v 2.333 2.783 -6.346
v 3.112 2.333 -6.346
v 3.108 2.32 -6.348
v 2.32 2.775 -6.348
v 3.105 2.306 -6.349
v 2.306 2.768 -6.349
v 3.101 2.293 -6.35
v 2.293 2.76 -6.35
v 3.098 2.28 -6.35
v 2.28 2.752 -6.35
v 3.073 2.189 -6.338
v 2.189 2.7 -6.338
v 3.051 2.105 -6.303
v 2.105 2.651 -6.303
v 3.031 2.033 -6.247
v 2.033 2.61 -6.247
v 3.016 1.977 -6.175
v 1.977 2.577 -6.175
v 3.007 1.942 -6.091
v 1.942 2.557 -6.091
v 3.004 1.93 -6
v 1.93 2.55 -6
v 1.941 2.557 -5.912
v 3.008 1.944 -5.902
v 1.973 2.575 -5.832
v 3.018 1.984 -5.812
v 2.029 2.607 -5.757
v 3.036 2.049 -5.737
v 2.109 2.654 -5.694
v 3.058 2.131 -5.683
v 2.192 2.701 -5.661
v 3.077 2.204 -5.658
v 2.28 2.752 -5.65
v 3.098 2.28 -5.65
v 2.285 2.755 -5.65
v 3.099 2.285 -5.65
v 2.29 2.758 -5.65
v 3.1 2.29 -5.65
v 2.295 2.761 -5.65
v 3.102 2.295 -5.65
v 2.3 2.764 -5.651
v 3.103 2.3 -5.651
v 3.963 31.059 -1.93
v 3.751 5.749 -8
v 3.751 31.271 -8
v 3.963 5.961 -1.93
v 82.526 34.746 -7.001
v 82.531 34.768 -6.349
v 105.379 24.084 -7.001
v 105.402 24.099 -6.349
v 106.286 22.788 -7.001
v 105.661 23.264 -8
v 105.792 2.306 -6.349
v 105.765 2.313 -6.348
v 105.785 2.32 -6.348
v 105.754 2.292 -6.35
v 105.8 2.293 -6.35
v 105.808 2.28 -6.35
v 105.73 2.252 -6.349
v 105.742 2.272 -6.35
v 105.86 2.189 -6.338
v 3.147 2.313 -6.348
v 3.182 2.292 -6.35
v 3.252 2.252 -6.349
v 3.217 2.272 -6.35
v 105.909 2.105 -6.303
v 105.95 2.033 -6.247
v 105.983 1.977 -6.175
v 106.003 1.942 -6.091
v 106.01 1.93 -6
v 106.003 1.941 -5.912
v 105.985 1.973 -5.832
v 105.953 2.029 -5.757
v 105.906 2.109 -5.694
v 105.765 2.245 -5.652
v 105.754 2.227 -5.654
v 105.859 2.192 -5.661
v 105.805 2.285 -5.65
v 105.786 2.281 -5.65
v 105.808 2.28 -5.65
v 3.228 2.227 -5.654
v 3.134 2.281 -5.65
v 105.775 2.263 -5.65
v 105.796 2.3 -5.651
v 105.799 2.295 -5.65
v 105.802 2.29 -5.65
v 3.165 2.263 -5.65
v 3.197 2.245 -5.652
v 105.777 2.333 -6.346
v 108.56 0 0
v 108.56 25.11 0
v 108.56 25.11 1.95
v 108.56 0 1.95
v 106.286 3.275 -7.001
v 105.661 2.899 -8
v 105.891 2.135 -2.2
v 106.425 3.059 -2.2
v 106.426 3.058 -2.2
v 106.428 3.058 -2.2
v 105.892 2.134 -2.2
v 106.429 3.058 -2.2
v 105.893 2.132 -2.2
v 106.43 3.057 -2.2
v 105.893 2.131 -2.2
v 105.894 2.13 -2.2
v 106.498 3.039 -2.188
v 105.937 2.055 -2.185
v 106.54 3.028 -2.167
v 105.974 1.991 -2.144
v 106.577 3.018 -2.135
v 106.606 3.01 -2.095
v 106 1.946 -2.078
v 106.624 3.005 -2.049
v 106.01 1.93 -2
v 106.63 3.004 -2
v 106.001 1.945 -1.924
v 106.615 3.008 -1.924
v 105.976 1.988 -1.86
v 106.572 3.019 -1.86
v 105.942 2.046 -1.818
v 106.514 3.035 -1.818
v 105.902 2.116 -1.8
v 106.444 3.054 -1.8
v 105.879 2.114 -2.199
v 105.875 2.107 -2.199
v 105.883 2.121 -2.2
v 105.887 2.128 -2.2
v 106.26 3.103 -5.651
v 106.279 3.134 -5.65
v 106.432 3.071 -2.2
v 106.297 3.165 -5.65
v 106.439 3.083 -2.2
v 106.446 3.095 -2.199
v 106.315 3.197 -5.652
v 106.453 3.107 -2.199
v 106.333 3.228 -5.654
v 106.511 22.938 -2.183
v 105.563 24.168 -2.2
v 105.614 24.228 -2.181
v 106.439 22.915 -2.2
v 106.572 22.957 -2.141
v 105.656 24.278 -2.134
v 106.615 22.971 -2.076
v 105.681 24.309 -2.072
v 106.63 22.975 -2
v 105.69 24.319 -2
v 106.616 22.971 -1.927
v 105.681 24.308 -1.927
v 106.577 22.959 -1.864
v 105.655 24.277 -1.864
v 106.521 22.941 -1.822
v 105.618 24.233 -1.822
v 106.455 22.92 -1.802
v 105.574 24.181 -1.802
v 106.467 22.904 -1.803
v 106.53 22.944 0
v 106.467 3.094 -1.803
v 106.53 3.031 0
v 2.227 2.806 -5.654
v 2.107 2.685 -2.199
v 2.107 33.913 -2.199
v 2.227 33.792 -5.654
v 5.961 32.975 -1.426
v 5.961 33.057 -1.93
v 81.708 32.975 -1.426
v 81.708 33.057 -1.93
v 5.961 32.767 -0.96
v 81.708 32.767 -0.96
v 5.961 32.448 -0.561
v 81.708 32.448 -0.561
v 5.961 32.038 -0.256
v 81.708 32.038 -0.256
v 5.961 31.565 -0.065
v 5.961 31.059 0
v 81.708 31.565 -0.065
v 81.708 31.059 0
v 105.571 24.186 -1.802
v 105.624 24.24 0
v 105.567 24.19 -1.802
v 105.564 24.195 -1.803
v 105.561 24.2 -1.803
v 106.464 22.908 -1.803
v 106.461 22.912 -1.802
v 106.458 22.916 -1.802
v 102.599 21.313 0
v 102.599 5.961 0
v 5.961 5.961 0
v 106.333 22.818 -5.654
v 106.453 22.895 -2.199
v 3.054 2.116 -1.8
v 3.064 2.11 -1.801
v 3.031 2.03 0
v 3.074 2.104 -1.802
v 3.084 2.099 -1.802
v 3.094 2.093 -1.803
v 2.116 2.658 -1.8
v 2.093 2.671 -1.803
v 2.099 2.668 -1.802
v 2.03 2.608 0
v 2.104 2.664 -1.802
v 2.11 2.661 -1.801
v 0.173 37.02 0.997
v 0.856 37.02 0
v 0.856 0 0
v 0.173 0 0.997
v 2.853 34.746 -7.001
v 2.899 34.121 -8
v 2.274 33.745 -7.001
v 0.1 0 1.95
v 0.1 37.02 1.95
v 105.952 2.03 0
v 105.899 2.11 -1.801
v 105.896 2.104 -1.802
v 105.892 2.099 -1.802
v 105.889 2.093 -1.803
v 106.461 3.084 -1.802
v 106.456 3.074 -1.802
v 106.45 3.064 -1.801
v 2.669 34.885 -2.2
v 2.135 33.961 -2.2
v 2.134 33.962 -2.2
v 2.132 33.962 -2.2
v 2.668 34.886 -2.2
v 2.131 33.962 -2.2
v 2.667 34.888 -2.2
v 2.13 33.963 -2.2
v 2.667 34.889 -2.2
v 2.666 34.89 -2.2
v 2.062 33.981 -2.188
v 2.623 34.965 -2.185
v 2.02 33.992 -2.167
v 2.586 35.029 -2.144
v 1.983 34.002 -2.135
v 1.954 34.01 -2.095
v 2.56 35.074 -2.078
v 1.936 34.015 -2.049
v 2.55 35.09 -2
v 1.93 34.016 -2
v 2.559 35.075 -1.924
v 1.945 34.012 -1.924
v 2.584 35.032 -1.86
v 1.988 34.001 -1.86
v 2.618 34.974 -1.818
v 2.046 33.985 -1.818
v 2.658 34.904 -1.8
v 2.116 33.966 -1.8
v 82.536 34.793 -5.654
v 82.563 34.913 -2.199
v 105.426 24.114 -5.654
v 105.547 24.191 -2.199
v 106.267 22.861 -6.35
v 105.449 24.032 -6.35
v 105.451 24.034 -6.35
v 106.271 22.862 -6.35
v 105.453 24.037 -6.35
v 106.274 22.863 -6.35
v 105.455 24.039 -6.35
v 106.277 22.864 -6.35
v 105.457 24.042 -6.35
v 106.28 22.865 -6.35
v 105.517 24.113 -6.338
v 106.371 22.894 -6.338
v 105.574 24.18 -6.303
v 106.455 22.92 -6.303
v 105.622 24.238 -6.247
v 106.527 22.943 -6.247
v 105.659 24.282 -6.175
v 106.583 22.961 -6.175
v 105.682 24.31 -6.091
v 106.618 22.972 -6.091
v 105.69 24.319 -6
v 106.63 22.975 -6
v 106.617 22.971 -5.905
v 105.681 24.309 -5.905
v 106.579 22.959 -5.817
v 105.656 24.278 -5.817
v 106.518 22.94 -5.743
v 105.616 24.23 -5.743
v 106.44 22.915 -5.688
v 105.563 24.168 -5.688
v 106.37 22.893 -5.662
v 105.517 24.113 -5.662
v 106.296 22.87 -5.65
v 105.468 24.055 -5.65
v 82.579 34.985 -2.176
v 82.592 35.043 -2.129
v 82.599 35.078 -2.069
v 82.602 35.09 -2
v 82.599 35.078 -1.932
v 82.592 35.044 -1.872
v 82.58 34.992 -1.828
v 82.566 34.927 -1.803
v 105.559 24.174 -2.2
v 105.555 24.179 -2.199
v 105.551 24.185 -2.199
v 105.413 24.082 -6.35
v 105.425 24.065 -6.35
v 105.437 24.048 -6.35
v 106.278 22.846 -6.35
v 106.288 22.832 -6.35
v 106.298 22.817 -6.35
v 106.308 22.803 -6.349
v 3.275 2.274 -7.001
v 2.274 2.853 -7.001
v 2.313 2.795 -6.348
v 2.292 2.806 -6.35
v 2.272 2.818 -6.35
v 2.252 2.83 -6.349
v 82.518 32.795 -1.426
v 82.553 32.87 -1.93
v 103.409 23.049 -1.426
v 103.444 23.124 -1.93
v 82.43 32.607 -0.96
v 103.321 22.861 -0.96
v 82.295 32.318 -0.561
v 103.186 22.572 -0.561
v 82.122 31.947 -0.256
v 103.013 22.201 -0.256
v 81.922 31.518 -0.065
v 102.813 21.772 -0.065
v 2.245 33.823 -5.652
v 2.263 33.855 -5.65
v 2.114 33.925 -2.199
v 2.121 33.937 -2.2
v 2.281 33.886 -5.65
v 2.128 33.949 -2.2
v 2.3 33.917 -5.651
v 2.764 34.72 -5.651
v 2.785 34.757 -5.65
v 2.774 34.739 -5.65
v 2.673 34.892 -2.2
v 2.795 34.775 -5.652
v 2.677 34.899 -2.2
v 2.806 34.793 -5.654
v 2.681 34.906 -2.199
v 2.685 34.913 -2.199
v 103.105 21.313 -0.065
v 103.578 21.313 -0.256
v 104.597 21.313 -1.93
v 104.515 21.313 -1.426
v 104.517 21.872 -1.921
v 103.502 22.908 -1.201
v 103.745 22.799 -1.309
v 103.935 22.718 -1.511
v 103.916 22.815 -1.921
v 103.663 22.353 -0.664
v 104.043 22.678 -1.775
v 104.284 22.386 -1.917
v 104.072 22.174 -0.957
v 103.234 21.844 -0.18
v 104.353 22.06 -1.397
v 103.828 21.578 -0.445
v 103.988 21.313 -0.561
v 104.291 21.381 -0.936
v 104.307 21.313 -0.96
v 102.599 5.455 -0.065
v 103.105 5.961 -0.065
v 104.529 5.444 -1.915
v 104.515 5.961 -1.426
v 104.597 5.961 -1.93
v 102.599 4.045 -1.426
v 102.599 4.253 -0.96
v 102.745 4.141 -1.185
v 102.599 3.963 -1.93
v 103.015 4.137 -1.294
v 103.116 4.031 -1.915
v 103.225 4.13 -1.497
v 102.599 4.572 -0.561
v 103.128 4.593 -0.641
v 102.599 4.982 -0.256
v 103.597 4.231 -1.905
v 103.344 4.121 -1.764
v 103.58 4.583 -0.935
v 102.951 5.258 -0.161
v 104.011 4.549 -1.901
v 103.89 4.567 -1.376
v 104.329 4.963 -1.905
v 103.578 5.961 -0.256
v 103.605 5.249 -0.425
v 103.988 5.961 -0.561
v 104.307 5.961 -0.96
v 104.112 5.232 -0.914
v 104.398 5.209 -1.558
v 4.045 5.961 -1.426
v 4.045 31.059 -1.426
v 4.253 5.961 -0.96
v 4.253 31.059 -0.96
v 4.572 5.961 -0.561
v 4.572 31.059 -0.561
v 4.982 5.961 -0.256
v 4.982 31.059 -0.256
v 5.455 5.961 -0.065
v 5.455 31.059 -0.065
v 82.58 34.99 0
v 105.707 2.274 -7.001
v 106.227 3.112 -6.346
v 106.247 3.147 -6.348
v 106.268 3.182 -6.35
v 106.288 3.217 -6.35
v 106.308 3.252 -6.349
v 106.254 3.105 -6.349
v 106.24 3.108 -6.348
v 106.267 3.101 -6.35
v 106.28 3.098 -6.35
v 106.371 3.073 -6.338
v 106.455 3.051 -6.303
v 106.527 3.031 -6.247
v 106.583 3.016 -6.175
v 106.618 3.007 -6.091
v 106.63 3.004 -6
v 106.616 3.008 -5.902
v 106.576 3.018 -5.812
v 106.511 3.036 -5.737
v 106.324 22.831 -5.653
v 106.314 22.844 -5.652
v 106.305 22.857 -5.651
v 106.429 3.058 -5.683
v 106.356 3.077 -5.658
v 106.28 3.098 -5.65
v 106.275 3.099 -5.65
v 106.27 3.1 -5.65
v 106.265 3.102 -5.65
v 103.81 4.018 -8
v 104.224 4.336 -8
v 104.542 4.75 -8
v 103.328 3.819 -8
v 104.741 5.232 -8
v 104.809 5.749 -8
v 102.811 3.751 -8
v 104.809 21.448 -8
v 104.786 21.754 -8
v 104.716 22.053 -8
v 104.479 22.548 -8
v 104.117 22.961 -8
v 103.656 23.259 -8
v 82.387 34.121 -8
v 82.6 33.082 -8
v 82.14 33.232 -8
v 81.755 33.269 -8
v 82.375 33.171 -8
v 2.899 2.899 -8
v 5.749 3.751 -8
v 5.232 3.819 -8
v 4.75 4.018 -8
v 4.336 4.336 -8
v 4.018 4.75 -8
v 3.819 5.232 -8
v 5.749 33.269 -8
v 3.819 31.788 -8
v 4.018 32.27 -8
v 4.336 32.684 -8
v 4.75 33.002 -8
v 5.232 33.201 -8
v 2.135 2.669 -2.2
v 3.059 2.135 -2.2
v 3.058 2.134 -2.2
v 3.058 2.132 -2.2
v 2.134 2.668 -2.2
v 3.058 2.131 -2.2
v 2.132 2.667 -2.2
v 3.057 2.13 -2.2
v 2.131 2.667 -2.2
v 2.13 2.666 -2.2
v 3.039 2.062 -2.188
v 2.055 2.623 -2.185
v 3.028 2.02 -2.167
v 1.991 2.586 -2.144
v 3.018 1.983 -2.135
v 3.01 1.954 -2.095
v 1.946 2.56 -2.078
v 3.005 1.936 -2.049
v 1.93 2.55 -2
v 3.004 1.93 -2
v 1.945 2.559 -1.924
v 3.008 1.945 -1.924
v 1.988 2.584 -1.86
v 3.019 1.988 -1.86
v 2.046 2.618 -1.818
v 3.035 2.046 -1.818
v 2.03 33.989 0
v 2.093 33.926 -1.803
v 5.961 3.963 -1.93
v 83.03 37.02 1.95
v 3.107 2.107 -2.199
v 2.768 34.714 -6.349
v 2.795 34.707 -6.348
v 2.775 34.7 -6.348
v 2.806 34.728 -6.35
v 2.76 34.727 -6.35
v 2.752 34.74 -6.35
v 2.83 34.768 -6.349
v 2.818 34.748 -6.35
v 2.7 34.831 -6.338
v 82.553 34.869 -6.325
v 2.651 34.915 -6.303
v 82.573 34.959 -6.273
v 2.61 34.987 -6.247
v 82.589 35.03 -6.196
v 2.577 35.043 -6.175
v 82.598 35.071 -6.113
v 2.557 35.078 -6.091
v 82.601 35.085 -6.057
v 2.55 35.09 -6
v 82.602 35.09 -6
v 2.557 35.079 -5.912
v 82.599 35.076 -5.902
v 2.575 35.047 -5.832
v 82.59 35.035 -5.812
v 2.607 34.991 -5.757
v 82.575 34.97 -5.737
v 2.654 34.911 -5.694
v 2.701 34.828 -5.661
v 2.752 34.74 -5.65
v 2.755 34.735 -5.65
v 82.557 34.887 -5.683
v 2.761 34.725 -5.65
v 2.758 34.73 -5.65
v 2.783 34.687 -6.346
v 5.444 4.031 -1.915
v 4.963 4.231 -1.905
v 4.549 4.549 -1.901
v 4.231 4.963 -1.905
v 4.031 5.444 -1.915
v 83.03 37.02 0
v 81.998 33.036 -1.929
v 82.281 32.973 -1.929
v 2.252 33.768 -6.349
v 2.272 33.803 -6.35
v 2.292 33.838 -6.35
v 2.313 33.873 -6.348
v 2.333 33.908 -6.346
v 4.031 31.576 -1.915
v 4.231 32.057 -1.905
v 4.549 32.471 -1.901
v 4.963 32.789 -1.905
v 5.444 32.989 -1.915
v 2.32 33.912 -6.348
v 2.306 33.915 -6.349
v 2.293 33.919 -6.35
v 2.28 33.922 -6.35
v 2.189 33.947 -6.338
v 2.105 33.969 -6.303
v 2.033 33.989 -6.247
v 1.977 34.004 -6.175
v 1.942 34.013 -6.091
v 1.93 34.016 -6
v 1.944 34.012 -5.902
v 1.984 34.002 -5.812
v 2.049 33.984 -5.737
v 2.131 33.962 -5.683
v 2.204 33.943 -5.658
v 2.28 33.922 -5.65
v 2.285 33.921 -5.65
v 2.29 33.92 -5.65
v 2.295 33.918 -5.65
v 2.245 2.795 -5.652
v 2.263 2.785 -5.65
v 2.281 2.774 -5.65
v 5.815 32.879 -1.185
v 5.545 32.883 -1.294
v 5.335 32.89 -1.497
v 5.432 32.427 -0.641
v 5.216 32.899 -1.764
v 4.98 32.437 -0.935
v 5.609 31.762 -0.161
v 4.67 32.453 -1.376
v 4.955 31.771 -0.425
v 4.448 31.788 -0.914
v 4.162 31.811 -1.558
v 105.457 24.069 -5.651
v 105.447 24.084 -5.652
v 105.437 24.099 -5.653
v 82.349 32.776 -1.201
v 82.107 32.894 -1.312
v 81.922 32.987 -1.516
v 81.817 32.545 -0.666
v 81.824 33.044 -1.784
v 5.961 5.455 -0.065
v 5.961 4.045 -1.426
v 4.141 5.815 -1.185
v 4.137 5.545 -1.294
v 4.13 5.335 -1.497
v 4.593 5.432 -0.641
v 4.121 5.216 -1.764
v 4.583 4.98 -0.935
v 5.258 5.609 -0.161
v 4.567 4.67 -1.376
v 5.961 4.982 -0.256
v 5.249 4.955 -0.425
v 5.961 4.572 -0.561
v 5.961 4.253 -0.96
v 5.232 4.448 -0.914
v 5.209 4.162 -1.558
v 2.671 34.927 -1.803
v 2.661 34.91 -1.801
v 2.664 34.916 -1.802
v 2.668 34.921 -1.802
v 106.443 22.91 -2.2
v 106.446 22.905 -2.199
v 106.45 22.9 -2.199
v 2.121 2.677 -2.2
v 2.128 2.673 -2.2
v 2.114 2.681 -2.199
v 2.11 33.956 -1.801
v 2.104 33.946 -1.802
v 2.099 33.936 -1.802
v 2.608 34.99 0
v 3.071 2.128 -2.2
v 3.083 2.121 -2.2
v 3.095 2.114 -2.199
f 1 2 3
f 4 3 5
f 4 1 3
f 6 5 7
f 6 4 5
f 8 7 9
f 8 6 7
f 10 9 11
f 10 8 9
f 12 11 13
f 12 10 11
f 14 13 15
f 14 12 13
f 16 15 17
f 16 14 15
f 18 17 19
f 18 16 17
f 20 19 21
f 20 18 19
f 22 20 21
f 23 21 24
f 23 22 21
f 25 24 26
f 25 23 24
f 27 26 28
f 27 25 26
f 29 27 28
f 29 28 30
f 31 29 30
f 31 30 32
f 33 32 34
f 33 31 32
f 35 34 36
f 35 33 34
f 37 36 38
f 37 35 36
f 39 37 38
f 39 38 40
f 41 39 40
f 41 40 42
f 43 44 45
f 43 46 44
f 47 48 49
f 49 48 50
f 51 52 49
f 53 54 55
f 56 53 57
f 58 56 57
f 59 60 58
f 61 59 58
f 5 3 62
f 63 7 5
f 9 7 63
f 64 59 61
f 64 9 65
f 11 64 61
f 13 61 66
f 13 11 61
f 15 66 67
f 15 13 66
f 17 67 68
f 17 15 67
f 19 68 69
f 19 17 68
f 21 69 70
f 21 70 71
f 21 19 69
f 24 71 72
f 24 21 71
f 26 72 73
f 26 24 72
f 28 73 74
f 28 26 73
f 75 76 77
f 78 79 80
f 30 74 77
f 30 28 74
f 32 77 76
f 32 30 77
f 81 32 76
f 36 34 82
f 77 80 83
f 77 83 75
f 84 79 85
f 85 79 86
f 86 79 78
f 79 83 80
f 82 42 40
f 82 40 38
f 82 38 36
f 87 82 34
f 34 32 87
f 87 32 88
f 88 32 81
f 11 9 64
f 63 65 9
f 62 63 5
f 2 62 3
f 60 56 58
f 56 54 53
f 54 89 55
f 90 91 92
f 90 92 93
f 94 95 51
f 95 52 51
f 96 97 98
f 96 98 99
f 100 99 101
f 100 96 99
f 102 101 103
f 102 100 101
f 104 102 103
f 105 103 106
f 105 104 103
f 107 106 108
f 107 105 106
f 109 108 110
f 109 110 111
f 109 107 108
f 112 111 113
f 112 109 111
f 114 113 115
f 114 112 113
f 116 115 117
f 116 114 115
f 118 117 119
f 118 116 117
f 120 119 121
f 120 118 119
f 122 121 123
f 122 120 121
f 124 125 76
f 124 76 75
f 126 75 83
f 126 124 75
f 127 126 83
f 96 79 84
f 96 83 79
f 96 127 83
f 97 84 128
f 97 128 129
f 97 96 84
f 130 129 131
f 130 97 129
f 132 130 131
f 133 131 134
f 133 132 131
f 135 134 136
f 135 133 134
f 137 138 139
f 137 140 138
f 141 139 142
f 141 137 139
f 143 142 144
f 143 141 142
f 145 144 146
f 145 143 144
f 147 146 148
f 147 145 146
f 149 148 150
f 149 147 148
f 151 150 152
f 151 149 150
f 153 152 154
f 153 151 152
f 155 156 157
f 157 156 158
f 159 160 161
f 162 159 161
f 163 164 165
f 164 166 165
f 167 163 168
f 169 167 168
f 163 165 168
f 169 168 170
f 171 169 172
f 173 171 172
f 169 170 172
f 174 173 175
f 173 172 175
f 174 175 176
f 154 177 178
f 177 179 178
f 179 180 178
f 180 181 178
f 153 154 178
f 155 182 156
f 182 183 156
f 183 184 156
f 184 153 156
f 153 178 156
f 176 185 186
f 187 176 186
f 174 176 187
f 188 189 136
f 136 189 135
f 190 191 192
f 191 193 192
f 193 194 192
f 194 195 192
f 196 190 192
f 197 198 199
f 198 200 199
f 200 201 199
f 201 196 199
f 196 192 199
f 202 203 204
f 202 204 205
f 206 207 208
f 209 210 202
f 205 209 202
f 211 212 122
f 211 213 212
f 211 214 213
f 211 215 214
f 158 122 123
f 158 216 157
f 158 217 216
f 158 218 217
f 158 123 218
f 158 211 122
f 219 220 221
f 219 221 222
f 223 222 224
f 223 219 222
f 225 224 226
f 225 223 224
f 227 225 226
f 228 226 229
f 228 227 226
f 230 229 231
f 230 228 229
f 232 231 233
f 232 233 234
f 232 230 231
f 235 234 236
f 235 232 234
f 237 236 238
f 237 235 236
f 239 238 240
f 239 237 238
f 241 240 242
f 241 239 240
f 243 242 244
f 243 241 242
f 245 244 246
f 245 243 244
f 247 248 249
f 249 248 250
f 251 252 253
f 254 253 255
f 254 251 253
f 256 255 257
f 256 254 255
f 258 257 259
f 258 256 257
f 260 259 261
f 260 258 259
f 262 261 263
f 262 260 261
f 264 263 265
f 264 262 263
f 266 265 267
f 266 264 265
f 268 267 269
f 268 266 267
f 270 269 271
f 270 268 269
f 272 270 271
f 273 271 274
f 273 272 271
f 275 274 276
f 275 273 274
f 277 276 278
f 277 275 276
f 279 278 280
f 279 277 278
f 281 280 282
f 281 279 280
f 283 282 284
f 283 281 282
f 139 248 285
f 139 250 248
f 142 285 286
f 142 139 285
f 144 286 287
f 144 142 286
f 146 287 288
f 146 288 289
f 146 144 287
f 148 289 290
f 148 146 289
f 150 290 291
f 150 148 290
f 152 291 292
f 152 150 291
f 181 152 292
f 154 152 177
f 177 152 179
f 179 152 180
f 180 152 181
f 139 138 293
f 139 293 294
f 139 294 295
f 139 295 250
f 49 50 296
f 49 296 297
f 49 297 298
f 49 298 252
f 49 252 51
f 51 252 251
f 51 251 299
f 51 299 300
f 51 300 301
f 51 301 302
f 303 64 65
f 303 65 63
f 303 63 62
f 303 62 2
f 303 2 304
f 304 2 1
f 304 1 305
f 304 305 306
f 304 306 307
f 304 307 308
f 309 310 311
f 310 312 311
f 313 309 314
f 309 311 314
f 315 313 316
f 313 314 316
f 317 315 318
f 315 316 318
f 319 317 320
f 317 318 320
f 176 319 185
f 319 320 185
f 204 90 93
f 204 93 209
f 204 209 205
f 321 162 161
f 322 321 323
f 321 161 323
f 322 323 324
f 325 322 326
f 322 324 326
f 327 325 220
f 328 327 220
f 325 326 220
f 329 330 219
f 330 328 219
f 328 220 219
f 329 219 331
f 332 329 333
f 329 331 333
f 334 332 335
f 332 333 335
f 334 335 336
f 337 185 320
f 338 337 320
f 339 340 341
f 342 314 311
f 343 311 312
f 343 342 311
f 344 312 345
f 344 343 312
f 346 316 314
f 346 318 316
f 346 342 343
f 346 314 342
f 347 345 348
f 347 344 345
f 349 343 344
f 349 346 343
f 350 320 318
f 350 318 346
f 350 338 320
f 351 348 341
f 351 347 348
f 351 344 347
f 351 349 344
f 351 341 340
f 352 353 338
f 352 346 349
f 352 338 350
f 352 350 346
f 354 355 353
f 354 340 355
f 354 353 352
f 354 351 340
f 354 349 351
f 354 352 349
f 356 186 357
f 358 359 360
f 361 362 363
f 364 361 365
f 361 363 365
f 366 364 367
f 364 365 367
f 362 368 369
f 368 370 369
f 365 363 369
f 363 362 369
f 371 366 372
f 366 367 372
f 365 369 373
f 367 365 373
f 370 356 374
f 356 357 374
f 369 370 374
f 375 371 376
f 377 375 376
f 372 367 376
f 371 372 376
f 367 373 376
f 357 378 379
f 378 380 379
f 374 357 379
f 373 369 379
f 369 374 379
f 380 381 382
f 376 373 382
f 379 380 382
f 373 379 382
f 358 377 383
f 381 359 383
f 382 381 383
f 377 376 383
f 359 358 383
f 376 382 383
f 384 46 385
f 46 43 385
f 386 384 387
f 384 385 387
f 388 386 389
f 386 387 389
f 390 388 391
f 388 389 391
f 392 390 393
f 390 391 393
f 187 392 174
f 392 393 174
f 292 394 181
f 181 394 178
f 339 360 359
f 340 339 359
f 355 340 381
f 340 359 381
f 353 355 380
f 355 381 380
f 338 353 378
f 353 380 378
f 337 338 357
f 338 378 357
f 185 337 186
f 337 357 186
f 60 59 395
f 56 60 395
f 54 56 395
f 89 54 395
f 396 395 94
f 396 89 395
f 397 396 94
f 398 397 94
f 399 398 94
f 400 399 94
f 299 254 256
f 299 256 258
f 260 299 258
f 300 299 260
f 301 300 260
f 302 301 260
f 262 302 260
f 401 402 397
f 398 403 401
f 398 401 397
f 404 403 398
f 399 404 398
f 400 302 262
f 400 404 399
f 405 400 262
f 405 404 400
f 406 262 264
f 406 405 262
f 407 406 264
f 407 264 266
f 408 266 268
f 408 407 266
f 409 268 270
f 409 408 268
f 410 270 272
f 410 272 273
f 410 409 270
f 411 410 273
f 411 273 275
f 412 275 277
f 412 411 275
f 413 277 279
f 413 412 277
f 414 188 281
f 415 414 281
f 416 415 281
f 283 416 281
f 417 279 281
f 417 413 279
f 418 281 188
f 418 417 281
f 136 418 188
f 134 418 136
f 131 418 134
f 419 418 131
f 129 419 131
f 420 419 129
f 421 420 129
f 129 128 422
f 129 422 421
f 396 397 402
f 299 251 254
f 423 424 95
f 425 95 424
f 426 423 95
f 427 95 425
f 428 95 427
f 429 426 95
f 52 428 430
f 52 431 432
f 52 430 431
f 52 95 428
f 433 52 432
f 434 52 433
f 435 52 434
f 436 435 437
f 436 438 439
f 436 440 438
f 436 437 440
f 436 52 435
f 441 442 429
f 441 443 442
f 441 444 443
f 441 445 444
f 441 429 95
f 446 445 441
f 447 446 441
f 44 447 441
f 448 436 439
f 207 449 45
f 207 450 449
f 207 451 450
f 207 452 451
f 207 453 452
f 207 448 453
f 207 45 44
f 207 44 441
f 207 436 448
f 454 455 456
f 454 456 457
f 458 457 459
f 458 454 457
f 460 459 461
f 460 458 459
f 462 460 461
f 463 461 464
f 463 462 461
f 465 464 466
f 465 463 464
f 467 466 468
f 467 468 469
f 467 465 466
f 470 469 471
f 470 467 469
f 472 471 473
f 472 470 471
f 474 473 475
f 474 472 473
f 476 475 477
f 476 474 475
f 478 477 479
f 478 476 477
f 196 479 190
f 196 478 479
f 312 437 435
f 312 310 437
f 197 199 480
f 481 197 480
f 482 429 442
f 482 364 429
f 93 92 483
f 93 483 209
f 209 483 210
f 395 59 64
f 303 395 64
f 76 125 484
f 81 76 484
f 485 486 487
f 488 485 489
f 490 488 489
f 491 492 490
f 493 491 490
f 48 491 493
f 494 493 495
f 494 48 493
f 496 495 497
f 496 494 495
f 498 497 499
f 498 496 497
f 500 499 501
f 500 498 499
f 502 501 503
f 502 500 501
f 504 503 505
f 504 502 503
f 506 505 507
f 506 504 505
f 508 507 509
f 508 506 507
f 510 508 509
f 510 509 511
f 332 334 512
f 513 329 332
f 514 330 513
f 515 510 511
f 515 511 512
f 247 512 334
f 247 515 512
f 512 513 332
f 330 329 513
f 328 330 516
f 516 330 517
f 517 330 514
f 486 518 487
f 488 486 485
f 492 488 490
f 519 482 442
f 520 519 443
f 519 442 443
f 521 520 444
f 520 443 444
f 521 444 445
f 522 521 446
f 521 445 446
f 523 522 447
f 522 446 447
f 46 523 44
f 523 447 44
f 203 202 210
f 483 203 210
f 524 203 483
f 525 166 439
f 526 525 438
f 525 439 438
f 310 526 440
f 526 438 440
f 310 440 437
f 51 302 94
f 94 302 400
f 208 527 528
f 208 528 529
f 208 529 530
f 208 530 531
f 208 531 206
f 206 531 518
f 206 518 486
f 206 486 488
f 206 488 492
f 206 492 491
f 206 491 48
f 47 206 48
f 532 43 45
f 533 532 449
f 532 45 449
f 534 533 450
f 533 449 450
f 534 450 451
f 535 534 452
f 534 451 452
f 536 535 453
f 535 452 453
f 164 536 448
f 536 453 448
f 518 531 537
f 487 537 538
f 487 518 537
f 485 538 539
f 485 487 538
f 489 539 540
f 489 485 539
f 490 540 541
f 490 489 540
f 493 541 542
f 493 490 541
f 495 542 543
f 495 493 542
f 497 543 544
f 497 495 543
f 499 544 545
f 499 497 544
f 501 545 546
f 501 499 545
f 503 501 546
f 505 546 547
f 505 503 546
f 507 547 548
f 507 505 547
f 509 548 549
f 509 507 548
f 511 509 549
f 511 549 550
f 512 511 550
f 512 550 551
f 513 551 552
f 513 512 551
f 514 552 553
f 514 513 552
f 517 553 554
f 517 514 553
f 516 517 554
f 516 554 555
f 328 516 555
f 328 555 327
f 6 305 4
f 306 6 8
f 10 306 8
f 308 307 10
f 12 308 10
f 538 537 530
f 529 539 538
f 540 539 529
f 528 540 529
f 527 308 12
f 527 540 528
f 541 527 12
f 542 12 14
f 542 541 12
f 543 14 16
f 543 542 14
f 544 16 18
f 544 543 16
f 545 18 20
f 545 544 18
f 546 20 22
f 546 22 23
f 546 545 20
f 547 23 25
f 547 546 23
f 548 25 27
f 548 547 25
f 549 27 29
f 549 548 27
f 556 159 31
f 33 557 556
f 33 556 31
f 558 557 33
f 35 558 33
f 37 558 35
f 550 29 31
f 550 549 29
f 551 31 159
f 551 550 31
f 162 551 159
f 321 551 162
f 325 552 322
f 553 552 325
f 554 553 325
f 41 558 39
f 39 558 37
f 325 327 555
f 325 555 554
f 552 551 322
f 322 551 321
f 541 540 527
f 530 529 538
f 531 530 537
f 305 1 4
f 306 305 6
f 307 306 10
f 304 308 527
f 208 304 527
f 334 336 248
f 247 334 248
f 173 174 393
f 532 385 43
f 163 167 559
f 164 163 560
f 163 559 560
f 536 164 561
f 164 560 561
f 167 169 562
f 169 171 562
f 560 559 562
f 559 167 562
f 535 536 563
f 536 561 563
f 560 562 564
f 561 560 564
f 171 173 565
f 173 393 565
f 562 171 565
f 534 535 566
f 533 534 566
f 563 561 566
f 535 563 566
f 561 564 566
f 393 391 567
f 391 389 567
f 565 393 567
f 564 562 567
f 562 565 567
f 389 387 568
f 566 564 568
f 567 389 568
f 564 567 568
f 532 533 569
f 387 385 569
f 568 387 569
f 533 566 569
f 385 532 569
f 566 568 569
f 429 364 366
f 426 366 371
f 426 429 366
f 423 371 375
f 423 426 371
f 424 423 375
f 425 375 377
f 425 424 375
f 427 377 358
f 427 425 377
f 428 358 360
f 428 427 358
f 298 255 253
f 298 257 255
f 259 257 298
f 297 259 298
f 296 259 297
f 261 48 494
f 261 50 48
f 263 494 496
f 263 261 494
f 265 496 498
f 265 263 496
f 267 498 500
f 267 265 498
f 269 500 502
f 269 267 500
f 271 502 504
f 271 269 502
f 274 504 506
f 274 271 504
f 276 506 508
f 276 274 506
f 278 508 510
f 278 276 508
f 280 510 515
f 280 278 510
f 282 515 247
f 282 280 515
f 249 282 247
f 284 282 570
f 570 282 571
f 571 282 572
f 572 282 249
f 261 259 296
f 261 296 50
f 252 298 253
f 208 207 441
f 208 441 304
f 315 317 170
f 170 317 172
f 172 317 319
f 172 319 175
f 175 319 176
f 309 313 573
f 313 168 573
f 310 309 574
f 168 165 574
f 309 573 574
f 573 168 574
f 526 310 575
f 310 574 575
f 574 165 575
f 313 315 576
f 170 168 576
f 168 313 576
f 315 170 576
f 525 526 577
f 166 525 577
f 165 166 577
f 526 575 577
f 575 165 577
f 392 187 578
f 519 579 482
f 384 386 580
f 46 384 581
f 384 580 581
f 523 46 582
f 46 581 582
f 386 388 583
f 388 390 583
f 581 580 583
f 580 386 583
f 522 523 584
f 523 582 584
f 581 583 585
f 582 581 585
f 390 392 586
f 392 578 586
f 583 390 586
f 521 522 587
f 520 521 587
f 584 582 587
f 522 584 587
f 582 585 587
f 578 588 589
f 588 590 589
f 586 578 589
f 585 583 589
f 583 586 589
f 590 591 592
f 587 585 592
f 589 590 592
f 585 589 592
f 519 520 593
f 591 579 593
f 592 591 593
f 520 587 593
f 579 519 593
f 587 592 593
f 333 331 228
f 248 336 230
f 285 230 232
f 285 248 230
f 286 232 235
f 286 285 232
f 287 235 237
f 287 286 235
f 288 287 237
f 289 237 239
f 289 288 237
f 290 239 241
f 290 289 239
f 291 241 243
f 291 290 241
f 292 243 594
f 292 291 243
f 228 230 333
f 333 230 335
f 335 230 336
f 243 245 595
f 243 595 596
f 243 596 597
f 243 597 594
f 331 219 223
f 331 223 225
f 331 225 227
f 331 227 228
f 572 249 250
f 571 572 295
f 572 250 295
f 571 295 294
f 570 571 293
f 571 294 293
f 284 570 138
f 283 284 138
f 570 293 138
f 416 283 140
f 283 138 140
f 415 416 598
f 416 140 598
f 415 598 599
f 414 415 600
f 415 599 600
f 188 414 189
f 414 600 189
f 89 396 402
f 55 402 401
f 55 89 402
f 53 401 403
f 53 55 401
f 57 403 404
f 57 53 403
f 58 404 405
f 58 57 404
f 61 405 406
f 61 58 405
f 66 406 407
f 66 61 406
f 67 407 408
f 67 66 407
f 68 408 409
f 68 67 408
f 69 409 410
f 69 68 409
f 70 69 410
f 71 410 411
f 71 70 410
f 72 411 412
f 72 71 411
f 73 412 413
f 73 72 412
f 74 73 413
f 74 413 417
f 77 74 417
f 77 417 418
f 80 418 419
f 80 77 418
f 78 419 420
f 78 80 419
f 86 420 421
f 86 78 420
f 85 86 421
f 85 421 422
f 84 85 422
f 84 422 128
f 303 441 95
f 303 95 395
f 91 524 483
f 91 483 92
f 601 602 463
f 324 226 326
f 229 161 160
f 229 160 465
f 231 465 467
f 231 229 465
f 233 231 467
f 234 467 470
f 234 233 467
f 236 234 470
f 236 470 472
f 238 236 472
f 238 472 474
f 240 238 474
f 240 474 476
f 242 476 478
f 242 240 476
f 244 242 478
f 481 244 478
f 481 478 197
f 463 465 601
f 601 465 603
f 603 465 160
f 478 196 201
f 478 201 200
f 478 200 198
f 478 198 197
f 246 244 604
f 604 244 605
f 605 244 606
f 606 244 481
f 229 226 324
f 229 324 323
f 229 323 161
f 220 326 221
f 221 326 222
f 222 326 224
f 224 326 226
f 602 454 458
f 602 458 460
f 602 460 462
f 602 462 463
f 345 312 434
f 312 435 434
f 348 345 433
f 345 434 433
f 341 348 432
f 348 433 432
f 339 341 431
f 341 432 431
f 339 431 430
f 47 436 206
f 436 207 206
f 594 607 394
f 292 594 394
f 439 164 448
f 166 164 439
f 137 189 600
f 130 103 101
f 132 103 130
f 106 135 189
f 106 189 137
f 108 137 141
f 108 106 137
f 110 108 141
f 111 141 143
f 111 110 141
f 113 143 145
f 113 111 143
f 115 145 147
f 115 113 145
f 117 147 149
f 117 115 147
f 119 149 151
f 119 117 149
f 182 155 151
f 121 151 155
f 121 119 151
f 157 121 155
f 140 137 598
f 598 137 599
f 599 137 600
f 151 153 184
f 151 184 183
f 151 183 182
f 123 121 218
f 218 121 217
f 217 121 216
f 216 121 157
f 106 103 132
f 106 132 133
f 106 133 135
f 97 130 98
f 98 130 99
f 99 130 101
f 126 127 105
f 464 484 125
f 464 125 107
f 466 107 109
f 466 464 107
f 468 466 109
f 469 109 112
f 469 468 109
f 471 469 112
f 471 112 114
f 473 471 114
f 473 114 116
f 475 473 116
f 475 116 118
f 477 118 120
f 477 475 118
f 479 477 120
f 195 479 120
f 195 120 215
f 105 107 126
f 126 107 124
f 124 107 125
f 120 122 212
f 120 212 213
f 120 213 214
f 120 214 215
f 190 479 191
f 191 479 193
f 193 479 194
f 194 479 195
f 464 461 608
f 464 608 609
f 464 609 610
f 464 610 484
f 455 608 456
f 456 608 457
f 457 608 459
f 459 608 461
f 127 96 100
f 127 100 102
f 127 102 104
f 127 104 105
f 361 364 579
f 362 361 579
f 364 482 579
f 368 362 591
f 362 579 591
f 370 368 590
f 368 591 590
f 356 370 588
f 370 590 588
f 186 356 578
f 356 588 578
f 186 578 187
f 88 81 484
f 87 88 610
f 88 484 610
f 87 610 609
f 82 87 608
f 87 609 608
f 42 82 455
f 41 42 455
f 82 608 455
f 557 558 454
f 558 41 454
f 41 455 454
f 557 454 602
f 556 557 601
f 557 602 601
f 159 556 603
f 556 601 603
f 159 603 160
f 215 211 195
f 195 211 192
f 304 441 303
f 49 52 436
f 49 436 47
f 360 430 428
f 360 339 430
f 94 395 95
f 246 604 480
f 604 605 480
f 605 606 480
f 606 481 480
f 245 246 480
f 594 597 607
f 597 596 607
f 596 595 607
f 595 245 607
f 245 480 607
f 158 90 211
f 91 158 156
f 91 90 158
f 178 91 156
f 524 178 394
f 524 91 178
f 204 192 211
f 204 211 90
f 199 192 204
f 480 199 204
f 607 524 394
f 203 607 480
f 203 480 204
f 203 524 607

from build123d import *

# Parameters (mm, degrees)
BOSS_EXTRUDE1_DEPTH = 1.95
EXTRUDE_THIN1_DEPTH = 8
EXTRUDE_THIN1_DRAFT = 2
CUT_EXTRUDE1_DEPTH  = 115.977189042
FILLET1_R           = 2
SWEEP4_PROFILE_R    = 0.35
SWEEP5_PROFILE_R    = 0.2


with BuildPart() as part:
    # Sketch1 → Boss-Extrude1 (new body)
    with BuildSketch(Plane.XY):
        Polygon((0, 0), (0, 37.02), (83.03, 37.02), (108.56, 25.11), (108.56, 0), align=None)
    extrude(amount=BOSS_EXTRUDE1_DEPTH)


with BuildPart() as extrude_thin1_tool:
    # Sketch2 → Extrude-Thin1 (with draft: the straight prism first)
    with BuildSketch(Plane(origin=(0, 0, 0), x_dir=(-1, 0, 0), z_dir=(0, 0, -1))):
        Polygon((-106.53, 2.03), (-2.03, 2.03), (-2.03, 34.99), (-82.579782869, 34.99), (-106.53, 23.816984488), align=None)
        Polygon((-104.53, 4.03), (-4.03, 4.03), (-4.03, 32.99), (-82.136219193, 32.99), (-104.53, 22.543077579), align=None, mode=Mode.SUBTRACT)
    extrude(amount=EXTRUDE_THIN1_DEPTH)
    # Extrude-Thin1: the draft: its side faces are tilted about the plane it starts from
    extrude_thin1_sides = [extrude_thin1_tool.faces().sort_by_distance(p)[0] for p in [
        (54.28, 2.03, -4),
        (2.03, 18.51, -4),
        (42.304891435, 34.99, -4),
        (94.554891435, 29.403492244, -4),
        (106.53, 12.923492244, -4),
        (104.53, 13.286538789, -4),
        (93.333109597, 27.766538789, -4),
        (43.083109597, 32.99, -4),
        (4.03, 18.51, -4),
        (54.28, 4.03, -4),
    ]]
    draft(extrude_thin1_sides, Plane(origin=(0, 0, 0), x_dir=(-1, 0, 0), z_dir=(0, 0, -1)), EXTRUDE_THIN1_DRAFT)


with BuildPart() as part_1:
    add(part.part)

    # Extrude-Thin1: add extrude_thin1_tool
    add(extrude_thin1_tool.part)

    # Sketch3 → Cut-Extrude1 (cut, through all)
    with BuildSketch(Plane(origin=(0, 37.02, 0), x_dir=(1, 0, 0), z_dir=(0, 1, 0))):
        Polygon((0, -1.95), (0.1, -1.95), (0.25, 0), (0, 0), align=None)
    extrude(amount=-CUT_EXTRUDE1_DEPTH, mode=Mode.SUBTRACT)

    # Fillet1
    fillet1_edges = [part_1.edges().sort_by_distance(p)[0] for p in [
        (104.53, 13.286538789, 0),
        (54.28, 4.03, 0),
        (4.03, 18.51, 0),
        (43.083109597, 32.99, 0),
        (93.333109597, 27.766538789, 0),
        (104.669683078, 3.890316922, -4),
        (3.890316922, 3.890316922, -4),
        (3.890316922, 33.129683078, -4),
        (82.167198363, 33.129683078, -4),
        (104.669683078, 22.632049198, -4),
    ]]
    fillet(fillet1_edges, radius=FILLET1_R)

    # Chamfer1
    # the kernel refuses this chamfer: 1, 0.87289825, 0.605967864, 0.589589202, 0.577756975 mm, written as the material it takes off along each edge
    with BuildSketch(Plane(origin=(105.775216634, 23.378600332, -7.333739449), x_dir=(-0.21304506320944425, 0.6200388912519721, 0.7550917655339046), z_dir=(0.7969229766736515, 0.5573974303176954, -0.23285590807371978))) as chamfer1_piece_1:
        Polygon((-0.550130529, -0.409319885), (0.773405063, -0.409319885), (-0.223274534, 0.818639769), align=None)
    extrude(amount=0.747100973, mode=Mode.SUBTRACT)
    with BuildSketch(Plane(origin=(105.884667536, 2.816165826, -7.333739449), x_dir=(0.0393259866782338, -0.5295093368050788, 0.8473920751387924), z_dir=(0.8165501905229234, -0.47176756829689104, -0.3326877633160196))) as chamfer1_piece_2:
        Polygon((-0.617215932, 0.346134252), (0.56215647, 0.346134252), (0.055059462, -0.692268505), align=None)
    extrude(amount=0.835536063, mode=Mode.SUBTRACT)
    with BuildSketch(Plane(origin=(2.816165826, 2.675332464, -7.333739449), x_dir=(0.3040517824810945, -0.5048305049346018, 0.8078976883600696), z_dir=(-0.471767568296886, -0.8165501905229261, -0.33268776331602)), Plane(origin=(2.675332464, 34.203834174, -7.333739449), x_dir=(-0.5048305049346006, -0.30405178248109604, 0.8078976883600698), z_dir=(-0.8165501905229273, 0.47176756829688477, -0.3326877633160189))) as chamfer1_piece_3:
        Polygon((-0.625989713, -0.33000198), (0.611036759, -0.33000198), (0.014952954, 0.660003959), align=None)
    extrude(amount=0.835536063, mode=Mode.SUBTRACT)
    with BuildSketch(Plane(origin=(106.250633844, 26.226127004, -8), x_dir=(-1, 0, 0), z_dir=(0, -1, 0))) as chamfer1_piece_4:
        with BuildLine():
            Line((0.610785972, 0.033921924), (-0.056096267, -1.033312751))
            Line((-0.056096267, -1.033312751), (-0.076084084, -1.032614761))
            ThreePointArc((-0.076084084, -1.032614761), (-0.038042042, -0.51630738), (-0.019987817, 0.00069799))
            Line((-0.019987817, 0.00069799), (0, 0.02))
            ThreePointArc((0, 0.02), (0.305392986, 0.02), (0.610785972, 0.053921924))
            Line((0.610785972, 0.053921924), (0.610785972, 0.033921924))
        make_face()
    extrude(amount=26.503846603, mode=Mode.SUBTRACT)
    with BuildSketch(Plane(origin=(108.837719599, 2.309366156, -8), x_dir=(0, 1, 0), z_dir=(-1, 0, 0))) as chamfer1_piece_5:
        with BuildLine():
            Line((0.610785972, 0.033921924), (-0.056096267, -1.033312751))
            Line((-0.056096267, -1.033312751), (-0.076084084, -1.032614761))
            ThreePointArc((-0.076084084, -1.032614761), (-0.038042042, -0.51630738), (-0.019987817, 0.00069799))
            Line((-0.019987817, 0.00069799), (0, 0.02))
            ThreePointArc((0, 0.02), (0.305392986, 0.02), (0.610785972, 0.053921924))
            Line((0.610785972, 0.053921924), (0.610785972, 0.033921924))
        make_face()
    extrude(amount=109.115439197, mode=Mode.SUBTRACT)
    with BuildSketch(Plane(origin=(2.309366156, -0.277719599, -8), x_dir=(1, 0, 0), z_dir=(0, 1, 0))) as chamfer1_piece_6:
        with BuildLine():
            Line((0.610785972, 0.033921924), (-0.056096267, -1.033312751))
            Line((-0.056096267, -1.033312751), (-0.076084084, -1.032614761))
            ThreePointArc((-0.076084084, -1.032614761), (-0.038042042, -0.51630738), (-0.019987817, 0.00069799))
            Line((-0.019987817, 0.00069799), (0, 0.02))
            ThreePointArc((0, 0.02), (0.305392986, 0.02), (0.610785972, 0.053921924))
            Line((0.610785972, 0.053921924), (0.610785972, 0.033921924))
        make_face()
    extrude(amount=37.575439197, mode=Mode.SUBTRACT)
    with BuildSketch(Plane(origin=(-0.277719599, 34.710633844, -8), x_dir=(0, -1, 0), z_dir=(1, 0, 0))) as chamfer1_piece_7:
        with BuildLine():
            Line((0.610785972, 0.033921924), (-0.056096267, -1.033312751))
            Line((-0.056096267, -1.033312751), (-0.076084084, -1.032614761))
            ThreePointArc((-0.076084084, -1.032614761), (-0.038042042, -0.51630738), (-0.019987817, 0.00069799))
            Line((-0.019987817, 0.00069799), (0, 0.02))
            ThreePointArc((0, 0.02), (0.305392986, 0.02), (0.610785972, 0.053921924))
            Line((0.610785972, 0.053921924), (0.610785972, 0.033921924))
        make_face()
    extrude(amount=85.382629883, mode=Mode.SUBTRACT)
    with BuildSketch(Plane(origin=(80.173310289, 35.804373155, -8), x_dir=(-0.4227688659566774, -0.9062375439020968, 0), z_dir=(0.9062375439020969, -0.4227688659566774, 0))) as chamfer1_piece_8:
        with BuildLine():
            Line((0.610785972, 0.033921924), (-0.056096267, -1.033312751))
            Line((-0.056096267, -1.033312751), (-0.076084084, -1.032614761))
            ThreePointArc((-0.076084084, -1.032614761), (-0.038042042, -0.51630738), (-0.019987817, 0.00069799))
            Line((-0.019987817, 0.00069799), (0, 0.02))
            ThreePointArc((0, 0.02), (0.305392986, 0.02), (0.610785972, 0.053921924))
            Line((0.610785972, 0.053921924), (0.610785972, 0.033921924))
        make_face()
    extrude(amount=31.362458978, mode=Mode.SUBTRACT)
    with BuildSketch(Plane(origin=(106.620265691, 23.874479532, 2.584871201), x_dir=(-0.9056858205769407, 0.4233673296311047, 0.02221032658249641), z_dir=(-0.034890877204488725, -0.022223864760439818, -0.9991439968908441))) as chamfer1_piece_9_section:
        with BuildLine():
            Line((1.034641016, 0.02), (-0.404288913, -0.810766582))
            Line((-0.404288913, -0.810766582), (-0.422407098, -0.802297144))
            ThreePointArc((-0.422407098, -0.802297144), (-0.209884464, -0.401765185), (-0.018118185, 0.008469438))
            Line((-0.018118185, 0.008469438), (0, 0.02))
            ThreePointArc((0, 0.02), (0.517320508, 0.02), (1.034641016, 0.04))
            Line((1.034641016, 0.04), (1.034641016, 0.02))
        make_face()
    chamfer1_piece_9 = extrude(amount=13.181025401, mode=Mode.PRIVATE)
    chamfer1_piece_9 = split(chamfer1_piece_9, bisect_by=Plane(origin=(106.620265691, 23.874479532, 0), z_dir=(0, 0, -1)), keep=Keep.TOP, mode=Mode.PRIVATE)
    add(chamfer1_piece_9, mode=Mode.SUBTRACT)
    with BuildSketch(Plane(origin=(106.620233057, 1.939766943, 2.583936666), x_dir=(-0.9993915682994698, -0.001217233815563483, 0.03485701584709124), z_dir=(-0.03487826274237467, 0.03487826274237467, -0.9987827659587183))) as chamfer1_piece_10_section:
        with BuildLine():
            Line((0.597799152, -0.034616631), (-0.021260152, 1.034615889))
            Line((-0.021260152, 1.034615889), (-0.041260137, 1.03459153))
            ThreePointArc((-0.041260137, 1.03459153), (-0.020630069, 0.517295765), (-0.019999985, -2.4359e-05))
            Line((-0.019999985, -2.4359e-05), (0, -0.02))
            ThreePointArc((0, -0.02), (0.298899576, -0.02), (0.597799152, -0.054616631))
            Line((0.597799152, -0.054616631), (0.597799152, -0.034616631))
        make_face()
    chamfer1_piece_10 = extrude(amount=13.183921249, mode=Mode.PRIVATE)
    chamfer1_piece_10 = split(chamfer1_piece_10, bisect_by=Plane(origin=(106.620233057, 1.939766943, 0), z_dir=(0, 0, -1)), keep=Keep.TOP, mode=Mode.PRIVATE)
    add(chamfer1_piece_10, mode=Mode.SUBTRACT)
    with BuildSketch(Plane(origin=(1.939766943, 1.939766943, 2.583936666), x_dir=(0.9993915682994698, -0.0012172338155664961, 0.03485701584709113), z_dir=(0.03487826274237467, 0.03487826274237467, -0.9987827659587183))) as chamfer1_piece_11_section:
        with BuildLine():
            Line((1.034641016, 0.02), (-0.03534471, -0.597756547))
            Line((-0.03534471, -0.597756547), (-0.055344695, -0.597732187))
            ThreePointArc((-0.055344695, -0.597732187), (-0.020364037, -0.298874995), (-0.019999985, 2.4359e-05))
            Line((-0.019999985, 2.4359e-05), (0, 0.02))
            ThreePointArc((0, 0.02), (0.517320508, 0.02), (1.034641016, 0.04))
            Line((1.034641016, 0.04), (1.034641016, 0.02))
        make_face()
    chamfer1_piece_11 = extrude(amount=13.183921249, mode=Mode.PRIVATE)
    chamfer1_piece_11 = split(chamfer1_piece_11, bisect_by=Plane(origin=(1.939766943, 1.939766943, 0), z_dir=(0, 0, -1)), keep=Keep.TOP, mode=Mode.PRIVATE)
    add(chamfer1_piece_11, mode=Mode.SUBTRACT)
    with BuildSketch(Plane(origin=(1.939766943, 35.080233057, 2.583936666), x_dir=(-0.001217233815566496, -0.9993915682994698, 0.03485701584709113), z_dir=(0.03487826274237467, -0.03487826274237467, -0.9987827659587183))) as chamfer1_piece_12_section:
        with BuildLine():
            Line((1.034641016, 0.02), (-0.03534471, -0.597756547))
            Line((-0.03534471, -0.597756547), (-0.055344695, -0.597732187))
            ThreePointArc((-0.055344695, -0.597732187), (-0.020364037, -0.298874995), (-0.019999985, 2.4359e-05))
            Line((-0.019999985, 2.4359e-05), (0, 0.02))
            ThreePointArc((0, 0.02), (0.517320508, 0.02), (1.034641016, 0.04))
            Line((1.034641016, 0.04), (1.034641016, 0.02))
        make_face()
    chamfer1_piece_12 = extrude(amount=13.183921249, mode=Mode.PRIVATE)
    chamfer1_piece_12 = split(chamfer1_piece_12, bisect_by=Plane(origin=(1.939766943, 35.080233057, 0), z_dir=(0, 0, -1)), keep=Keep.TOP, mode=Mode.PRIVATE)
    add(chamfer1_piece_12, mode=Mode.SUBTRACT)
    with BuildSketch(Plane(origin=(0.25, 39.607085755, 0), x_dir=(1, 0, 0), z_dir=(0, -1, 0))) as chamfer1_piece_13:
        with BuildLine():
            Line((0.628565799, -0.033005051), (-0.099294433, 1.030059536))
            Line((-0.099294433, 1.030059536), (-0.119235523, 1.028525606))
            ThreePointArc((-0.119235523, 1.028525606), (-0.059617761, 0.514262803), (-0.01994109, -0.00153393))
            Line((-0.01994109, -0.00153393), (0, -0.02))
            ThreePointArc((0, -0.02), (0.314282899, -0.02), (0.628565799, -0.053005051))
            Line((0.628565799, -0.053005051), (0.628565799, -0.033005051))
        make_face()
    extrude(amount=42.194171509, mode=Mode.SUBTRACT)

    # Sweep4: sweep along a path in Sketch13
    with BuildLine(Plane(origin=(0, 0, -6), x_dir=(-1, 0, 0), z_dir=(0, 0, -1))) as sweep4_path:
        Line((-2.752395457, 34.74), (-82.52433741, 34.74))
        Line((-82.52433741, 34.74), (-105.457097335, 24.041638437))
        Line((-105.457097335, 24.041638437), (-106.28, 22.865116971))
        Line((-106.28, 22.865116971), (-106.28, 3.097636961))
        Line((-106.28, 3.097636961), (-105.807604543, 2.28))
        Line((-105.807604543, 2.28), (-3.097636961, 2.28))
        Line((-3.097636961, 2.28), (-2.28, 2.752395457))
        Line((-2.28, 2.752395457), (-2.28, 33.922363039))
        Line((-2.28, 33.922363039), (-2.752395457, 34.74))
    # Sweep4 profile (on start of the path) → Sweep4 (sweep)
    with BuildSketch(Plane(origin=(2.752395457, 34.74, -6), x_dir=(0, 1, 0), z_dir=(1, 0, 0))):
        Circle(SWEEP4_PROFILE_R)
    sweep(path=sweep4_path.line, transition=Transition.RIGHT)

    # Sweep5: sweep along a path in Sketch37
    with BuildLine(Plane(origin=(0, 0, -2), x_dir=(-1, 0, 0), z_dir=(0, 0, -1))) as sweep5_path:
        Line((-3.057420066, 2.13), (-2.13, 2.665823412))
        Line((-2.13, 2.665823412), (-2.13, 33.962579934))
        Line((-2.13, 33.962579934), (-2.665823412, 34.89))
        Line((-2.665823412, 34.89), (-82.557604685, 34.89))
        Line((-82.557604685, 34.89), (-105.556962081, 24.160570052))
        Line((-105.556962081, 24.160570052), (-106.43, 22.912369146))
        Line((-106.43, 22.912369146), (-106.43, 3.057420066))
        Line((-106.43, 3.057420066), (-105.894176588, 2.13))
        Line((-105.894176588, 2.13), (-3.057420066, 2.13))
    # Sweep5 profile (on start of the path) → Sweep5 (sweep)
    with BuildSketch(Plane(origin=(3.057420066, 2.13, -2), x_dir=(-0.5002640936209776, -0.8658728755617546, 0), z_dir=(-0.8658728755617546, 0.5002640936209776, 0))):
        Circle(SWEEP5_PROFILE_R)
    sweep(path=sweep5_path.line, transition=Transition.RIGHT)


solid = part_1.part
